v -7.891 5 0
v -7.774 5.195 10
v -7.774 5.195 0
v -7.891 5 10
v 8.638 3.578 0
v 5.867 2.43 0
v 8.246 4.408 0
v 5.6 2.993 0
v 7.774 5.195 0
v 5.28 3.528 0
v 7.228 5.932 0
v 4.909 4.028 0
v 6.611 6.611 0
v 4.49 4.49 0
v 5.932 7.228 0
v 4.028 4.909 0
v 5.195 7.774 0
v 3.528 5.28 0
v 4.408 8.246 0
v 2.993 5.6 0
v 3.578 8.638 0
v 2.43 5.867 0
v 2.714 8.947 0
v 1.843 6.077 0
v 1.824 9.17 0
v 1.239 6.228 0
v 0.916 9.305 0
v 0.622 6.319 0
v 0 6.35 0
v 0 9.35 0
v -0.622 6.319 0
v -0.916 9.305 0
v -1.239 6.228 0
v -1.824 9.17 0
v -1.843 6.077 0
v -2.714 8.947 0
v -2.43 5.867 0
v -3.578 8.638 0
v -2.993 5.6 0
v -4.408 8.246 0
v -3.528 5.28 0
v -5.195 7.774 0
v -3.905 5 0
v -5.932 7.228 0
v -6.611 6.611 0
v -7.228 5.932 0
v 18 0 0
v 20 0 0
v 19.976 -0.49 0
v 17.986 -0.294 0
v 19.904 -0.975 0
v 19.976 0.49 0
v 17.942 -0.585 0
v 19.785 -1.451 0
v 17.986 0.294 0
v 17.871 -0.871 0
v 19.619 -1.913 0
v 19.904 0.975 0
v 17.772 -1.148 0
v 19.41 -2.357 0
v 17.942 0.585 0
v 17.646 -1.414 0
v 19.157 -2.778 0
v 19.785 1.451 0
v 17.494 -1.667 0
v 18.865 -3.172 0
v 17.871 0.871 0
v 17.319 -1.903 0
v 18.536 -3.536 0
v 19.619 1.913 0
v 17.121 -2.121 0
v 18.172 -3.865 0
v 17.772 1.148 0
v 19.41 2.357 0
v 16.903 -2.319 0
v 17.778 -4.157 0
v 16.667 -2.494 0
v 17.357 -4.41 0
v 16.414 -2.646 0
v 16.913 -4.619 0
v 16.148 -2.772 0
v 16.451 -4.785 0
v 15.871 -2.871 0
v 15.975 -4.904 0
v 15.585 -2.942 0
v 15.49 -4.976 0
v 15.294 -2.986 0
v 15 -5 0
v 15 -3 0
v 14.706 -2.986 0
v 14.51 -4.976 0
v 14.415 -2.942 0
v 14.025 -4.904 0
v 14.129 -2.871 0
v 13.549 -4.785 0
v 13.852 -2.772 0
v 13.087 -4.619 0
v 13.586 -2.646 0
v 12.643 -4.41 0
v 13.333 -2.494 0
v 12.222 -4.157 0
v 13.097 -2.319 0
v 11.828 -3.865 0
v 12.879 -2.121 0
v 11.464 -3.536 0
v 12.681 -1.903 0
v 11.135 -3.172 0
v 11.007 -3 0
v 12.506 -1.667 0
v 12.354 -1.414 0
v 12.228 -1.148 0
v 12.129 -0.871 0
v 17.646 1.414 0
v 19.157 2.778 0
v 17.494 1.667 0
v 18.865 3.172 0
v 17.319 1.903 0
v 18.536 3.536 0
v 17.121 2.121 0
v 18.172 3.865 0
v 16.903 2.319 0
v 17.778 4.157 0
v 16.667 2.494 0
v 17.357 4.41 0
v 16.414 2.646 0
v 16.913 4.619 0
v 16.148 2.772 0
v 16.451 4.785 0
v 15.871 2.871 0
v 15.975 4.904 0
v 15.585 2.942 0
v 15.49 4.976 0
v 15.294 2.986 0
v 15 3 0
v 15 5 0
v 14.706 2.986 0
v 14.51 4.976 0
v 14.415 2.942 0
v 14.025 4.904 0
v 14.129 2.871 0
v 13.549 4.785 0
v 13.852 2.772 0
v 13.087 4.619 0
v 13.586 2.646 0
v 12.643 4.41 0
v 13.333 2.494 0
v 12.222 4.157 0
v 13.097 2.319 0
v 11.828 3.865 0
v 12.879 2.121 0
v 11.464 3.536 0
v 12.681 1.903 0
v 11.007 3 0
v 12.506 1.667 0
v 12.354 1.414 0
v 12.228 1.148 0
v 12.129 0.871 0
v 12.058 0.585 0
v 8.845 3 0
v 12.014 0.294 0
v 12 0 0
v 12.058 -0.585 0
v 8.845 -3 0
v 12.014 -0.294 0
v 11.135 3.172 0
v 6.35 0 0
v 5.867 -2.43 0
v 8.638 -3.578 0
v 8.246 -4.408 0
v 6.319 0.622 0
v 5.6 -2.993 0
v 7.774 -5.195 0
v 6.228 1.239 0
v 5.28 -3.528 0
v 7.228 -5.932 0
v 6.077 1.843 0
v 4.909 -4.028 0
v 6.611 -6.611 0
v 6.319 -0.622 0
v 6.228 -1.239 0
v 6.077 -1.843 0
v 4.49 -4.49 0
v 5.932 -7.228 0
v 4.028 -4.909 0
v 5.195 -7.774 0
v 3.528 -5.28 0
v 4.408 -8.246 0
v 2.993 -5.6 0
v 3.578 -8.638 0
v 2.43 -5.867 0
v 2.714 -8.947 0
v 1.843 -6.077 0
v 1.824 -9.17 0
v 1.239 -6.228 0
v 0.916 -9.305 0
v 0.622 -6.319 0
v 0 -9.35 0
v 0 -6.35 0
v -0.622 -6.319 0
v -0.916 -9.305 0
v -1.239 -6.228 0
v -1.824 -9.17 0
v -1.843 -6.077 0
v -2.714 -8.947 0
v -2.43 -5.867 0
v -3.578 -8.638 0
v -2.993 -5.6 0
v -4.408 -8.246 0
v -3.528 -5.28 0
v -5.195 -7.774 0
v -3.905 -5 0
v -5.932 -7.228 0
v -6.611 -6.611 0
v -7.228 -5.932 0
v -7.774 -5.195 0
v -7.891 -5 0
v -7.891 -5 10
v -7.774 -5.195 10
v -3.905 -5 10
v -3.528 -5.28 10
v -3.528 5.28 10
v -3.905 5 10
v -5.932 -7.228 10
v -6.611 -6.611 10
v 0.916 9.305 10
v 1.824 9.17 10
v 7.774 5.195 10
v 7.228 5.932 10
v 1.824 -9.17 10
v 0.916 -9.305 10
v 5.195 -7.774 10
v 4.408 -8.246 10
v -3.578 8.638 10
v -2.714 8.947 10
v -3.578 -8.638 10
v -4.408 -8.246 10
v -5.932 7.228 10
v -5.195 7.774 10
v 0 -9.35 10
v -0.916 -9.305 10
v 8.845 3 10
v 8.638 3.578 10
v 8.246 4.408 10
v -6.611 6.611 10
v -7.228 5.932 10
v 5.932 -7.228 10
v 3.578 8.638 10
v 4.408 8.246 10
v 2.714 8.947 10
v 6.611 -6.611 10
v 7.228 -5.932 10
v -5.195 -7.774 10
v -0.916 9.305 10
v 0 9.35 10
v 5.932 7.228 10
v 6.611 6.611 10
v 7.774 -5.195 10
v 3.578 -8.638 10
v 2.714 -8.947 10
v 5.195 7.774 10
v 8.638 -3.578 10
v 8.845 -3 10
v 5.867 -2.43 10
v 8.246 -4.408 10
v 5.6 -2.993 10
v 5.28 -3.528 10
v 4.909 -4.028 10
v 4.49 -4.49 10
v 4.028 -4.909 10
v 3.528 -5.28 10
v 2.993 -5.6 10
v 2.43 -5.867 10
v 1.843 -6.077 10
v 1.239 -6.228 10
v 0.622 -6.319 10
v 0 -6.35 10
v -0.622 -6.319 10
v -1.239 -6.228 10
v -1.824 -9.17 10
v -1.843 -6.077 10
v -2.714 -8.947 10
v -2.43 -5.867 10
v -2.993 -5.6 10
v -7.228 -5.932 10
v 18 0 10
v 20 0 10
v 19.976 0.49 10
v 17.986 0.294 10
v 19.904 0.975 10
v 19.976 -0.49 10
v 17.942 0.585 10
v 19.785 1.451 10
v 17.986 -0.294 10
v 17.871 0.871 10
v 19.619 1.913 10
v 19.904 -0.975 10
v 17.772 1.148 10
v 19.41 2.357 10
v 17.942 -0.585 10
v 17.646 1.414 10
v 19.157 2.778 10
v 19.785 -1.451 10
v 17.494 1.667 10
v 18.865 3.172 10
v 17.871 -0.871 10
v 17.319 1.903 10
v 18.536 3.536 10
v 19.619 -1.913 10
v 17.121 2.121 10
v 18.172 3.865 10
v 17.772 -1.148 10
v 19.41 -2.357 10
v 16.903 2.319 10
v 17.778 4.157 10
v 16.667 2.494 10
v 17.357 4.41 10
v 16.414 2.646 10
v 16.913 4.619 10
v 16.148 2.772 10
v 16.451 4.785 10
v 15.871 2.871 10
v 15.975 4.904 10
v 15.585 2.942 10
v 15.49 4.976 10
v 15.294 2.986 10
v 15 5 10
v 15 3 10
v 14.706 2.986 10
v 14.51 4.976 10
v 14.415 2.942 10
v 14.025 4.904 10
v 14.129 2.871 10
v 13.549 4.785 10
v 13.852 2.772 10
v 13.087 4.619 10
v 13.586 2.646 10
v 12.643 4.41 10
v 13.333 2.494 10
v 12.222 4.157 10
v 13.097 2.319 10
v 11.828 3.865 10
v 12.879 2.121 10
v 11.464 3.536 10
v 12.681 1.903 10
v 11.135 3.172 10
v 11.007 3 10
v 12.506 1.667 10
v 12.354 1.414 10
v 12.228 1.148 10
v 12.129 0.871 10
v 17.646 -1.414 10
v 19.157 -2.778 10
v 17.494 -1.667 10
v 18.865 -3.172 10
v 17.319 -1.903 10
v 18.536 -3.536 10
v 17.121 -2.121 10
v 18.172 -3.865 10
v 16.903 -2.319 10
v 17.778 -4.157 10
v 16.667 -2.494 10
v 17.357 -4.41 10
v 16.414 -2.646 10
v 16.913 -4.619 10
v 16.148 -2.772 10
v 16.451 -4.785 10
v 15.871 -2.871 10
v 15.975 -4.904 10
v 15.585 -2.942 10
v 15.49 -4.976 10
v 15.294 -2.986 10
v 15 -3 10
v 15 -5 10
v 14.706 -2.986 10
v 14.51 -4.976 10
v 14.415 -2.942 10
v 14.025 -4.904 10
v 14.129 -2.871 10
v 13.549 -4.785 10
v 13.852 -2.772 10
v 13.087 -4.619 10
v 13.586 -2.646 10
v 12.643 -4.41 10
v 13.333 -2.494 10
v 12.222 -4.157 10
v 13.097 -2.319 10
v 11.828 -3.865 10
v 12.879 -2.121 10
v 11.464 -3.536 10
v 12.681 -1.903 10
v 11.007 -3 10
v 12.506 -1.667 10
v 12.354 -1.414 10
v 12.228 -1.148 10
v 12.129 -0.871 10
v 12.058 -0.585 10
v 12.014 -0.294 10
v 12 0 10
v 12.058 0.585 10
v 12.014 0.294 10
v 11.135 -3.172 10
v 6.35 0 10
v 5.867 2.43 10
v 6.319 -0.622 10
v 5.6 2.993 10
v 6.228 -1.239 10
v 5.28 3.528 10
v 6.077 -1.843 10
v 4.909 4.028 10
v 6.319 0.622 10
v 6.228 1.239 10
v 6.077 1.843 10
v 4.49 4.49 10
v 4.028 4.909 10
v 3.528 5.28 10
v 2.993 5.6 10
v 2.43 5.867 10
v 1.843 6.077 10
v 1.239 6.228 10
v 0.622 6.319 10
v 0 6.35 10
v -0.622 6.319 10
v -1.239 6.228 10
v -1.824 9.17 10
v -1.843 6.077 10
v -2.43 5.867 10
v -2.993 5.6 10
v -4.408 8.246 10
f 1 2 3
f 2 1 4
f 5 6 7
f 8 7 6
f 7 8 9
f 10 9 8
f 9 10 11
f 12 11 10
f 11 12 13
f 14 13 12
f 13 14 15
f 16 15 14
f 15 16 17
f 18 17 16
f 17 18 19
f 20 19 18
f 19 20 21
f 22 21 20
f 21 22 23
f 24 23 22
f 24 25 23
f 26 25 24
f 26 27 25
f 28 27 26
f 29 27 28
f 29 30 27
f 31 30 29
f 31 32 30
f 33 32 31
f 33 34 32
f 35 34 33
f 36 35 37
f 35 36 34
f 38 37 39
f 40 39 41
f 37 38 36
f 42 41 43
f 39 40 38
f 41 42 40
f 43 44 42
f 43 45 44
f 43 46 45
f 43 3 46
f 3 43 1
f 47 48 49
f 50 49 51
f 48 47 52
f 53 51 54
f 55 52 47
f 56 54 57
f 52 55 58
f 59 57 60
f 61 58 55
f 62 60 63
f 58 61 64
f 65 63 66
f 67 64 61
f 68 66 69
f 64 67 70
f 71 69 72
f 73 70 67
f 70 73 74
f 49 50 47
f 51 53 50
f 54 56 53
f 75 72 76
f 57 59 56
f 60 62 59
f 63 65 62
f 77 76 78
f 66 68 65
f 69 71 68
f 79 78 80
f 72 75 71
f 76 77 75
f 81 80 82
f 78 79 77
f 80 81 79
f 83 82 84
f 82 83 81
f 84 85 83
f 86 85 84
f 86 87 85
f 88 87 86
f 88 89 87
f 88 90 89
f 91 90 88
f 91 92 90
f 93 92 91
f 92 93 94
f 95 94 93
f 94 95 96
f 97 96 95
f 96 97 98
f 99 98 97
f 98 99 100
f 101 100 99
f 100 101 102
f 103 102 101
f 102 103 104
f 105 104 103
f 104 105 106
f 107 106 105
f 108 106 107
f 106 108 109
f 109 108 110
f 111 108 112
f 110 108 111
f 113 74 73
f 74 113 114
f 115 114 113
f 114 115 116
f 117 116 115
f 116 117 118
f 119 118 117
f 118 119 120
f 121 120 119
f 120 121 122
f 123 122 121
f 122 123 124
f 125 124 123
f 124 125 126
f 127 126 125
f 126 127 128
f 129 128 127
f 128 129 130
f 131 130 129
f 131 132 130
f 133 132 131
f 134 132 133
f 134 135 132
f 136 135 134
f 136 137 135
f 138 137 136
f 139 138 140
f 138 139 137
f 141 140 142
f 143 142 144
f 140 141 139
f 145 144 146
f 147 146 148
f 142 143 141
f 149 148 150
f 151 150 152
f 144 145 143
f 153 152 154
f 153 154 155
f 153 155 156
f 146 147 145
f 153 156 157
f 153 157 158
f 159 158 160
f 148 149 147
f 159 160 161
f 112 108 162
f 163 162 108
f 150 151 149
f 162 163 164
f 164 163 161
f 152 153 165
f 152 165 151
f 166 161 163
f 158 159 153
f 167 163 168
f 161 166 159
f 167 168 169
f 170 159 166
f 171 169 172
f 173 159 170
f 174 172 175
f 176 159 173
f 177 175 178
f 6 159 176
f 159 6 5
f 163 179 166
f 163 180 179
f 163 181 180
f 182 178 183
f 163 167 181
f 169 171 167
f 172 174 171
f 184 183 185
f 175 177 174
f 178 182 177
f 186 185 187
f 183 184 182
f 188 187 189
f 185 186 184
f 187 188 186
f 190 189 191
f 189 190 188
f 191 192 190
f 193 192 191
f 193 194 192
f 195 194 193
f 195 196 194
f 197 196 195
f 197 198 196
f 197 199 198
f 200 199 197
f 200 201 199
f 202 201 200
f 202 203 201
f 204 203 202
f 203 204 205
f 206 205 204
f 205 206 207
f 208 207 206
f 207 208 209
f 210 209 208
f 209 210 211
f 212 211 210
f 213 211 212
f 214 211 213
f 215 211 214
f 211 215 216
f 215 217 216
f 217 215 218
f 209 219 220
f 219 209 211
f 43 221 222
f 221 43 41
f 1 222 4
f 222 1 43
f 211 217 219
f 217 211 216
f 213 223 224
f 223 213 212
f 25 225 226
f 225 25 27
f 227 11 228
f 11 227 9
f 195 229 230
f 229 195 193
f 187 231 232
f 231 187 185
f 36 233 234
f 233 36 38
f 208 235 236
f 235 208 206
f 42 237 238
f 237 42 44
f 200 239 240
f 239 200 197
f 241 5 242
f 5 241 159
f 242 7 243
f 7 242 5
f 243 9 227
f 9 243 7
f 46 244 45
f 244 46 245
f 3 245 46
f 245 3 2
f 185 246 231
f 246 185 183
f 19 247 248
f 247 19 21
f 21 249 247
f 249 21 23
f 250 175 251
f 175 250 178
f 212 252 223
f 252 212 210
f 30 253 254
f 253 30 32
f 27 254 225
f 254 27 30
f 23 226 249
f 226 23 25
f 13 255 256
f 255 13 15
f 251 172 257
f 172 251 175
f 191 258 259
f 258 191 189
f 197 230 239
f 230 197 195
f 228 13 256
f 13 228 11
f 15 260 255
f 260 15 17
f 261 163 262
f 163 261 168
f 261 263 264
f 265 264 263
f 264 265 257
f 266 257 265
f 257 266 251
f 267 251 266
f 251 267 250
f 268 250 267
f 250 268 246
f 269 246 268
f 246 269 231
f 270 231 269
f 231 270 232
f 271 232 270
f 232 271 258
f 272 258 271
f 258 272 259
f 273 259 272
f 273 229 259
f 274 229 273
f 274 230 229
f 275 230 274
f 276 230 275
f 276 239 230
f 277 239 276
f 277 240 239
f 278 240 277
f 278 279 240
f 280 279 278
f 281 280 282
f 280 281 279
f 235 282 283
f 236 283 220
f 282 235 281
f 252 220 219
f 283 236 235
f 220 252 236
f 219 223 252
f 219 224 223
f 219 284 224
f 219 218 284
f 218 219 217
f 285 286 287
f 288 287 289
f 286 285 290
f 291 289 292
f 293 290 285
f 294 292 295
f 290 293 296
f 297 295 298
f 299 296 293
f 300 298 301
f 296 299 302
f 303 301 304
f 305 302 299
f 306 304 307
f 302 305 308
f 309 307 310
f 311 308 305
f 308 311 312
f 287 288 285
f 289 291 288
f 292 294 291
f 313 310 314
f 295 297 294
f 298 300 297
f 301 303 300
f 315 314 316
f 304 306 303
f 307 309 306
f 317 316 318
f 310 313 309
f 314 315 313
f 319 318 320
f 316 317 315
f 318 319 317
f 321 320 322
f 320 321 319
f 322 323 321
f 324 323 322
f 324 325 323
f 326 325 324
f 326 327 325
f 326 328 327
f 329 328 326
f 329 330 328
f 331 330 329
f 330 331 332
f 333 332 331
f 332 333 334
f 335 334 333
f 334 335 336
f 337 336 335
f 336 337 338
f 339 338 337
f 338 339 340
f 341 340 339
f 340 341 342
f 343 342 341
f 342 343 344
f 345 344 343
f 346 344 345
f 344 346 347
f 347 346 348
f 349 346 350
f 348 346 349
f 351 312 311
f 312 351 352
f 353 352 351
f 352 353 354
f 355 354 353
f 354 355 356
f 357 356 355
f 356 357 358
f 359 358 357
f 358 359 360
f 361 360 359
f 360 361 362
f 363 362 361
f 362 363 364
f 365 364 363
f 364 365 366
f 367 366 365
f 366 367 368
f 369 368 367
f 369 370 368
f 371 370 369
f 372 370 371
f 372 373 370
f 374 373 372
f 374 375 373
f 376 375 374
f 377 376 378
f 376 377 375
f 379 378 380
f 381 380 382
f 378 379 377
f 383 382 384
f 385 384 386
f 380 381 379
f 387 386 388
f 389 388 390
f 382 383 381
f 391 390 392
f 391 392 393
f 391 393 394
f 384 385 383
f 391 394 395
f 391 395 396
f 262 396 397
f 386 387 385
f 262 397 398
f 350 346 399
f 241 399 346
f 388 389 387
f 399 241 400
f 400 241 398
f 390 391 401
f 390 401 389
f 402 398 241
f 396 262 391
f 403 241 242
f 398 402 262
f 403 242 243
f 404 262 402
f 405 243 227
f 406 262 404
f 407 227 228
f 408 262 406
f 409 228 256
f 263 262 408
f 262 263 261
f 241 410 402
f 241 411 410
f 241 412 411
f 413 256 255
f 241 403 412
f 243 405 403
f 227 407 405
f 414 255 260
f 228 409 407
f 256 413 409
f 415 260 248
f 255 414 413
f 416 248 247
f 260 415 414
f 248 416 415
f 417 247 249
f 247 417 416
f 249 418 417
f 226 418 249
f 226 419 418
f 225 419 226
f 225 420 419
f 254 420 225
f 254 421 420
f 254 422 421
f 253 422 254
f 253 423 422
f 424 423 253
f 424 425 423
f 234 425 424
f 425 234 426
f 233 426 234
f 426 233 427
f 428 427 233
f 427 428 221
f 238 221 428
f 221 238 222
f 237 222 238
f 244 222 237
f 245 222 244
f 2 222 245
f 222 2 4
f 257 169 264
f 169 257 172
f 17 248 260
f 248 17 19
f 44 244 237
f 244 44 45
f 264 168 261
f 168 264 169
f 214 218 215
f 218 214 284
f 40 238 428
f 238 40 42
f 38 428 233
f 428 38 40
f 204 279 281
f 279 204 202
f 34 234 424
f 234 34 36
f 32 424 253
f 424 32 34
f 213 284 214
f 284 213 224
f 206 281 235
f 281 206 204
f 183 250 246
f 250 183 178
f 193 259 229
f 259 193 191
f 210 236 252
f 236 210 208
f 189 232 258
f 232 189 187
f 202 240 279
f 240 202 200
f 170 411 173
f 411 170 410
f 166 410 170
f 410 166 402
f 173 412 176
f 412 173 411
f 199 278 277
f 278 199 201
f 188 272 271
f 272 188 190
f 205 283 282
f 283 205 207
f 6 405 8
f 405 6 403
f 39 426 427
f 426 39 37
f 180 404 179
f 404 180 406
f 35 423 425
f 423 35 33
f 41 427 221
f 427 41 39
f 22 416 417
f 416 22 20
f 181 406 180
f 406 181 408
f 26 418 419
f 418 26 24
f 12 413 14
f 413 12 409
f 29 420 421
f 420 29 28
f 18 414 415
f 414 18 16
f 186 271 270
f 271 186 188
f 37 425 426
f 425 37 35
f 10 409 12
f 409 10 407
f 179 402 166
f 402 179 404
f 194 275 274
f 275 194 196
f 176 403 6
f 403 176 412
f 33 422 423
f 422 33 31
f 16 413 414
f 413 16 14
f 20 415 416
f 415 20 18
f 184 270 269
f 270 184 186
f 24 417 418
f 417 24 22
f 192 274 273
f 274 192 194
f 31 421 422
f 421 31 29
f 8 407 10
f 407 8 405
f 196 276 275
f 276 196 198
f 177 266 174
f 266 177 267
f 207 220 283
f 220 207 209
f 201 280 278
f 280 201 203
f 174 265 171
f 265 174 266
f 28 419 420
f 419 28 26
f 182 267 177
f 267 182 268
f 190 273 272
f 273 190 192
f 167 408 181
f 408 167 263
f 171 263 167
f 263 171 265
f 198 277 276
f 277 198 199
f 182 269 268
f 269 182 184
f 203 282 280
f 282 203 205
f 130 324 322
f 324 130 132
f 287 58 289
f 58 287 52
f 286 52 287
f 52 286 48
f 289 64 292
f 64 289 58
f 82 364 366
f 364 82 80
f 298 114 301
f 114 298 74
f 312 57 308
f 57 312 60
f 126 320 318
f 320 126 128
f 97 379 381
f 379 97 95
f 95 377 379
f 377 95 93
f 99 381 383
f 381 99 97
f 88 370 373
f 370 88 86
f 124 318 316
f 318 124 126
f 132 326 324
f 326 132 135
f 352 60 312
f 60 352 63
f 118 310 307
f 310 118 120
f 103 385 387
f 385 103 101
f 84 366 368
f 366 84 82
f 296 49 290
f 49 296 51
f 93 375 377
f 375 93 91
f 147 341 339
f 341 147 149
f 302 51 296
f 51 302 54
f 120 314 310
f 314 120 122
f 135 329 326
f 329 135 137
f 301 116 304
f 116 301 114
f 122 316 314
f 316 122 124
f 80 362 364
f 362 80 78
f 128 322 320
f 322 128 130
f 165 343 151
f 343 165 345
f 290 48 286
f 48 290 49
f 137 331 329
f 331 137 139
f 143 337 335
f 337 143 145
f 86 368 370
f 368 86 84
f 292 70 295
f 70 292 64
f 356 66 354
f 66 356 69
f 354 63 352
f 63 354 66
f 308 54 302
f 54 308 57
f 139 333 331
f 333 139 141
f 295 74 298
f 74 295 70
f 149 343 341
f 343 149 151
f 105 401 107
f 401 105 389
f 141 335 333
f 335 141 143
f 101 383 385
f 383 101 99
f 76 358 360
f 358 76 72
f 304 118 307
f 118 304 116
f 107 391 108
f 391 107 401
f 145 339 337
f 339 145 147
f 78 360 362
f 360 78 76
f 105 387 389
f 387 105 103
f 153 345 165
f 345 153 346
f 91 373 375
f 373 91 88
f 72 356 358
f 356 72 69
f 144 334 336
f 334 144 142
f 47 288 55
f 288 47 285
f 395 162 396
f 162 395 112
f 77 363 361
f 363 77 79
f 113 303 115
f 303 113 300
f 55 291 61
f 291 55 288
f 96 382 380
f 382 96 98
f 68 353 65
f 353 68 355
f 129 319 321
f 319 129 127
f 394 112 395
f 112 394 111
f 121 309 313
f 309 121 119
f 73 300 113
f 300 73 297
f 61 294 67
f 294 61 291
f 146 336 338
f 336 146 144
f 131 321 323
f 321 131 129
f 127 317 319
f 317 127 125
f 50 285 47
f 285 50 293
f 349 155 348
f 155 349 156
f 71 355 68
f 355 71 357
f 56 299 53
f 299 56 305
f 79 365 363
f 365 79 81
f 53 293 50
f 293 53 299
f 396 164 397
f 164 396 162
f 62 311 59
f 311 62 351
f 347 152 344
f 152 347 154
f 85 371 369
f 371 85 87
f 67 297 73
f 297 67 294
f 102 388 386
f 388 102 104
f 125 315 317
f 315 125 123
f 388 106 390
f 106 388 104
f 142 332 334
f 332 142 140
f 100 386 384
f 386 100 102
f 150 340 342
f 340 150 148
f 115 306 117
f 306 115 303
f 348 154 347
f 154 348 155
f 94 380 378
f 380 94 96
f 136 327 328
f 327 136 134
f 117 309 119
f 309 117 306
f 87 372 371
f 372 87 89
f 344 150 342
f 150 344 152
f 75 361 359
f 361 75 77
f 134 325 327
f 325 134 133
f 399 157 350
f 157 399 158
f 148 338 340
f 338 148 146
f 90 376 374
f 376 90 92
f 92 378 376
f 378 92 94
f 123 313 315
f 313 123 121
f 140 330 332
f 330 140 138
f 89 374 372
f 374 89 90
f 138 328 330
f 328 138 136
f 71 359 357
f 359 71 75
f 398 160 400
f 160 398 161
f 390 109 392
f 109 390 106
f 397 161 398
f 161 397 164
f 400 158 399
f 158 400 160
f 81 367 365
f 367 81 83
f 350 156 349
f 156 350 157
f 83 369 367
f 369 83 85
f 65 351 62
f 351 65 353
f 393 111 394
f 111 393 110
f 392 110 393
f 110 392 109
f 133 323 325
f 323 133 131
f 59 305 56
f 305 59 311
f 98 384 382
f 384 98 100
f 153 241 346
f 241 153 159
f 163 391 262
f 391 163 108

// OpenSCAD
$fn = 64;

// Dimensions
rod_id = 12.7;        // inner diameter of rod ring (mm)
rod_wall = 3;         // wall thickness of rod ring (mm)
rod_od = rod_id + 2 * rod_wall;  // outer diameter of rod ring (mm)
rod_opening_width = 10;  // width of opening cut from -X side (mm)

tubing_id = 6;        // inner diameter of tubing ring (mm)
tubing_wall = 2;      // wall thickness of tubing ring (mm)
tubing_od = tubing_id + 2 * tubing_wall;  // outer diameter of tubing ring (mm)
tubing_opening_width = 4.5;  // width of opening cut from +X side (mm)

bridge_x_start = 8;   // start x-coordinate of bridge (mm)
bridge_x_end = 12;    // end x-coordinate of bridge (mm)
bridge_width = 6;     // width of bridge in Y-direction (mm)

height = 10;

// Rod ring with opening - centered at origin, bottom at z=0
module rod_ring_with_opening() {
    difference() {
        // Outer circle (bottom at z=0)
        cylinder(h = height, r = rod_od / 2);
        // Inner circle (hole)
        cylinder(h = height + 0.02, r = rod_id / 2);
        // Opening cut: remove x < 0 and -5 < y < 5 from the ring only
        // Use intersection with ring region to avoid cutting too much
        intersection() {
            translate([-rod_od - 1, -rod_opening_width/2, -0.01])
                cube([rod_od + 2, rod_opening_width, height + 0.02]);
            // Ring region: outside inner circle, inside outer circle
            difference() {
                cylinder(h = height + 0.02, r = rod_od / 2);
                cylinder(h = height + 0.02, r = rod_id / 2);
            }
        }
    }
}

// Tubing ring with opening - centered at (15, 0), bottom at z=0
module tubing_ring_with_opening() {
    translate([15, 0, 0]) {
        difference() {
            // Outer circle (bottom at z=0)
            cylinder(h = height, r = tubing_od / 2);
            // Inner circle (hole)
            cylinder(h = height + 0.02, r = tubing_id / 2);
            // Opening cut: remove x > 15 and -2.25 < y < 2.25 from the ring only
            intersection() {
                translate([tubing_od + 1, -tubing_opening_width/2, -0.01])
                    cube([tubing_od + 2, tubing_opening_width, height + 0.02]);
                // Ring region: outside inner circle, inside outer circle
                difference() {
                    cylinder(h = height + 0.02, r = tubing_od / 2);
                    cylinder(h = height + 0.02, r = tubing_id / 2);
                }
            }
        }
    }
}

// Solid bridge between rings - bottom at z=0
module bridge() {
    // Bridge is 6 mm wide in Y (from -3 to +3), from x=8 to x=12
    // Position it so it connects the rings without blocking holes
    translate([bridge_x_start, -bridge_width / 2, 0])
        cube([bridge_x_end - bridge_x_start, bridge_width, height]);
}

// Assemble the clip
rod_ring_with_opening();
tubing_ring_with_opening();
bridge();
